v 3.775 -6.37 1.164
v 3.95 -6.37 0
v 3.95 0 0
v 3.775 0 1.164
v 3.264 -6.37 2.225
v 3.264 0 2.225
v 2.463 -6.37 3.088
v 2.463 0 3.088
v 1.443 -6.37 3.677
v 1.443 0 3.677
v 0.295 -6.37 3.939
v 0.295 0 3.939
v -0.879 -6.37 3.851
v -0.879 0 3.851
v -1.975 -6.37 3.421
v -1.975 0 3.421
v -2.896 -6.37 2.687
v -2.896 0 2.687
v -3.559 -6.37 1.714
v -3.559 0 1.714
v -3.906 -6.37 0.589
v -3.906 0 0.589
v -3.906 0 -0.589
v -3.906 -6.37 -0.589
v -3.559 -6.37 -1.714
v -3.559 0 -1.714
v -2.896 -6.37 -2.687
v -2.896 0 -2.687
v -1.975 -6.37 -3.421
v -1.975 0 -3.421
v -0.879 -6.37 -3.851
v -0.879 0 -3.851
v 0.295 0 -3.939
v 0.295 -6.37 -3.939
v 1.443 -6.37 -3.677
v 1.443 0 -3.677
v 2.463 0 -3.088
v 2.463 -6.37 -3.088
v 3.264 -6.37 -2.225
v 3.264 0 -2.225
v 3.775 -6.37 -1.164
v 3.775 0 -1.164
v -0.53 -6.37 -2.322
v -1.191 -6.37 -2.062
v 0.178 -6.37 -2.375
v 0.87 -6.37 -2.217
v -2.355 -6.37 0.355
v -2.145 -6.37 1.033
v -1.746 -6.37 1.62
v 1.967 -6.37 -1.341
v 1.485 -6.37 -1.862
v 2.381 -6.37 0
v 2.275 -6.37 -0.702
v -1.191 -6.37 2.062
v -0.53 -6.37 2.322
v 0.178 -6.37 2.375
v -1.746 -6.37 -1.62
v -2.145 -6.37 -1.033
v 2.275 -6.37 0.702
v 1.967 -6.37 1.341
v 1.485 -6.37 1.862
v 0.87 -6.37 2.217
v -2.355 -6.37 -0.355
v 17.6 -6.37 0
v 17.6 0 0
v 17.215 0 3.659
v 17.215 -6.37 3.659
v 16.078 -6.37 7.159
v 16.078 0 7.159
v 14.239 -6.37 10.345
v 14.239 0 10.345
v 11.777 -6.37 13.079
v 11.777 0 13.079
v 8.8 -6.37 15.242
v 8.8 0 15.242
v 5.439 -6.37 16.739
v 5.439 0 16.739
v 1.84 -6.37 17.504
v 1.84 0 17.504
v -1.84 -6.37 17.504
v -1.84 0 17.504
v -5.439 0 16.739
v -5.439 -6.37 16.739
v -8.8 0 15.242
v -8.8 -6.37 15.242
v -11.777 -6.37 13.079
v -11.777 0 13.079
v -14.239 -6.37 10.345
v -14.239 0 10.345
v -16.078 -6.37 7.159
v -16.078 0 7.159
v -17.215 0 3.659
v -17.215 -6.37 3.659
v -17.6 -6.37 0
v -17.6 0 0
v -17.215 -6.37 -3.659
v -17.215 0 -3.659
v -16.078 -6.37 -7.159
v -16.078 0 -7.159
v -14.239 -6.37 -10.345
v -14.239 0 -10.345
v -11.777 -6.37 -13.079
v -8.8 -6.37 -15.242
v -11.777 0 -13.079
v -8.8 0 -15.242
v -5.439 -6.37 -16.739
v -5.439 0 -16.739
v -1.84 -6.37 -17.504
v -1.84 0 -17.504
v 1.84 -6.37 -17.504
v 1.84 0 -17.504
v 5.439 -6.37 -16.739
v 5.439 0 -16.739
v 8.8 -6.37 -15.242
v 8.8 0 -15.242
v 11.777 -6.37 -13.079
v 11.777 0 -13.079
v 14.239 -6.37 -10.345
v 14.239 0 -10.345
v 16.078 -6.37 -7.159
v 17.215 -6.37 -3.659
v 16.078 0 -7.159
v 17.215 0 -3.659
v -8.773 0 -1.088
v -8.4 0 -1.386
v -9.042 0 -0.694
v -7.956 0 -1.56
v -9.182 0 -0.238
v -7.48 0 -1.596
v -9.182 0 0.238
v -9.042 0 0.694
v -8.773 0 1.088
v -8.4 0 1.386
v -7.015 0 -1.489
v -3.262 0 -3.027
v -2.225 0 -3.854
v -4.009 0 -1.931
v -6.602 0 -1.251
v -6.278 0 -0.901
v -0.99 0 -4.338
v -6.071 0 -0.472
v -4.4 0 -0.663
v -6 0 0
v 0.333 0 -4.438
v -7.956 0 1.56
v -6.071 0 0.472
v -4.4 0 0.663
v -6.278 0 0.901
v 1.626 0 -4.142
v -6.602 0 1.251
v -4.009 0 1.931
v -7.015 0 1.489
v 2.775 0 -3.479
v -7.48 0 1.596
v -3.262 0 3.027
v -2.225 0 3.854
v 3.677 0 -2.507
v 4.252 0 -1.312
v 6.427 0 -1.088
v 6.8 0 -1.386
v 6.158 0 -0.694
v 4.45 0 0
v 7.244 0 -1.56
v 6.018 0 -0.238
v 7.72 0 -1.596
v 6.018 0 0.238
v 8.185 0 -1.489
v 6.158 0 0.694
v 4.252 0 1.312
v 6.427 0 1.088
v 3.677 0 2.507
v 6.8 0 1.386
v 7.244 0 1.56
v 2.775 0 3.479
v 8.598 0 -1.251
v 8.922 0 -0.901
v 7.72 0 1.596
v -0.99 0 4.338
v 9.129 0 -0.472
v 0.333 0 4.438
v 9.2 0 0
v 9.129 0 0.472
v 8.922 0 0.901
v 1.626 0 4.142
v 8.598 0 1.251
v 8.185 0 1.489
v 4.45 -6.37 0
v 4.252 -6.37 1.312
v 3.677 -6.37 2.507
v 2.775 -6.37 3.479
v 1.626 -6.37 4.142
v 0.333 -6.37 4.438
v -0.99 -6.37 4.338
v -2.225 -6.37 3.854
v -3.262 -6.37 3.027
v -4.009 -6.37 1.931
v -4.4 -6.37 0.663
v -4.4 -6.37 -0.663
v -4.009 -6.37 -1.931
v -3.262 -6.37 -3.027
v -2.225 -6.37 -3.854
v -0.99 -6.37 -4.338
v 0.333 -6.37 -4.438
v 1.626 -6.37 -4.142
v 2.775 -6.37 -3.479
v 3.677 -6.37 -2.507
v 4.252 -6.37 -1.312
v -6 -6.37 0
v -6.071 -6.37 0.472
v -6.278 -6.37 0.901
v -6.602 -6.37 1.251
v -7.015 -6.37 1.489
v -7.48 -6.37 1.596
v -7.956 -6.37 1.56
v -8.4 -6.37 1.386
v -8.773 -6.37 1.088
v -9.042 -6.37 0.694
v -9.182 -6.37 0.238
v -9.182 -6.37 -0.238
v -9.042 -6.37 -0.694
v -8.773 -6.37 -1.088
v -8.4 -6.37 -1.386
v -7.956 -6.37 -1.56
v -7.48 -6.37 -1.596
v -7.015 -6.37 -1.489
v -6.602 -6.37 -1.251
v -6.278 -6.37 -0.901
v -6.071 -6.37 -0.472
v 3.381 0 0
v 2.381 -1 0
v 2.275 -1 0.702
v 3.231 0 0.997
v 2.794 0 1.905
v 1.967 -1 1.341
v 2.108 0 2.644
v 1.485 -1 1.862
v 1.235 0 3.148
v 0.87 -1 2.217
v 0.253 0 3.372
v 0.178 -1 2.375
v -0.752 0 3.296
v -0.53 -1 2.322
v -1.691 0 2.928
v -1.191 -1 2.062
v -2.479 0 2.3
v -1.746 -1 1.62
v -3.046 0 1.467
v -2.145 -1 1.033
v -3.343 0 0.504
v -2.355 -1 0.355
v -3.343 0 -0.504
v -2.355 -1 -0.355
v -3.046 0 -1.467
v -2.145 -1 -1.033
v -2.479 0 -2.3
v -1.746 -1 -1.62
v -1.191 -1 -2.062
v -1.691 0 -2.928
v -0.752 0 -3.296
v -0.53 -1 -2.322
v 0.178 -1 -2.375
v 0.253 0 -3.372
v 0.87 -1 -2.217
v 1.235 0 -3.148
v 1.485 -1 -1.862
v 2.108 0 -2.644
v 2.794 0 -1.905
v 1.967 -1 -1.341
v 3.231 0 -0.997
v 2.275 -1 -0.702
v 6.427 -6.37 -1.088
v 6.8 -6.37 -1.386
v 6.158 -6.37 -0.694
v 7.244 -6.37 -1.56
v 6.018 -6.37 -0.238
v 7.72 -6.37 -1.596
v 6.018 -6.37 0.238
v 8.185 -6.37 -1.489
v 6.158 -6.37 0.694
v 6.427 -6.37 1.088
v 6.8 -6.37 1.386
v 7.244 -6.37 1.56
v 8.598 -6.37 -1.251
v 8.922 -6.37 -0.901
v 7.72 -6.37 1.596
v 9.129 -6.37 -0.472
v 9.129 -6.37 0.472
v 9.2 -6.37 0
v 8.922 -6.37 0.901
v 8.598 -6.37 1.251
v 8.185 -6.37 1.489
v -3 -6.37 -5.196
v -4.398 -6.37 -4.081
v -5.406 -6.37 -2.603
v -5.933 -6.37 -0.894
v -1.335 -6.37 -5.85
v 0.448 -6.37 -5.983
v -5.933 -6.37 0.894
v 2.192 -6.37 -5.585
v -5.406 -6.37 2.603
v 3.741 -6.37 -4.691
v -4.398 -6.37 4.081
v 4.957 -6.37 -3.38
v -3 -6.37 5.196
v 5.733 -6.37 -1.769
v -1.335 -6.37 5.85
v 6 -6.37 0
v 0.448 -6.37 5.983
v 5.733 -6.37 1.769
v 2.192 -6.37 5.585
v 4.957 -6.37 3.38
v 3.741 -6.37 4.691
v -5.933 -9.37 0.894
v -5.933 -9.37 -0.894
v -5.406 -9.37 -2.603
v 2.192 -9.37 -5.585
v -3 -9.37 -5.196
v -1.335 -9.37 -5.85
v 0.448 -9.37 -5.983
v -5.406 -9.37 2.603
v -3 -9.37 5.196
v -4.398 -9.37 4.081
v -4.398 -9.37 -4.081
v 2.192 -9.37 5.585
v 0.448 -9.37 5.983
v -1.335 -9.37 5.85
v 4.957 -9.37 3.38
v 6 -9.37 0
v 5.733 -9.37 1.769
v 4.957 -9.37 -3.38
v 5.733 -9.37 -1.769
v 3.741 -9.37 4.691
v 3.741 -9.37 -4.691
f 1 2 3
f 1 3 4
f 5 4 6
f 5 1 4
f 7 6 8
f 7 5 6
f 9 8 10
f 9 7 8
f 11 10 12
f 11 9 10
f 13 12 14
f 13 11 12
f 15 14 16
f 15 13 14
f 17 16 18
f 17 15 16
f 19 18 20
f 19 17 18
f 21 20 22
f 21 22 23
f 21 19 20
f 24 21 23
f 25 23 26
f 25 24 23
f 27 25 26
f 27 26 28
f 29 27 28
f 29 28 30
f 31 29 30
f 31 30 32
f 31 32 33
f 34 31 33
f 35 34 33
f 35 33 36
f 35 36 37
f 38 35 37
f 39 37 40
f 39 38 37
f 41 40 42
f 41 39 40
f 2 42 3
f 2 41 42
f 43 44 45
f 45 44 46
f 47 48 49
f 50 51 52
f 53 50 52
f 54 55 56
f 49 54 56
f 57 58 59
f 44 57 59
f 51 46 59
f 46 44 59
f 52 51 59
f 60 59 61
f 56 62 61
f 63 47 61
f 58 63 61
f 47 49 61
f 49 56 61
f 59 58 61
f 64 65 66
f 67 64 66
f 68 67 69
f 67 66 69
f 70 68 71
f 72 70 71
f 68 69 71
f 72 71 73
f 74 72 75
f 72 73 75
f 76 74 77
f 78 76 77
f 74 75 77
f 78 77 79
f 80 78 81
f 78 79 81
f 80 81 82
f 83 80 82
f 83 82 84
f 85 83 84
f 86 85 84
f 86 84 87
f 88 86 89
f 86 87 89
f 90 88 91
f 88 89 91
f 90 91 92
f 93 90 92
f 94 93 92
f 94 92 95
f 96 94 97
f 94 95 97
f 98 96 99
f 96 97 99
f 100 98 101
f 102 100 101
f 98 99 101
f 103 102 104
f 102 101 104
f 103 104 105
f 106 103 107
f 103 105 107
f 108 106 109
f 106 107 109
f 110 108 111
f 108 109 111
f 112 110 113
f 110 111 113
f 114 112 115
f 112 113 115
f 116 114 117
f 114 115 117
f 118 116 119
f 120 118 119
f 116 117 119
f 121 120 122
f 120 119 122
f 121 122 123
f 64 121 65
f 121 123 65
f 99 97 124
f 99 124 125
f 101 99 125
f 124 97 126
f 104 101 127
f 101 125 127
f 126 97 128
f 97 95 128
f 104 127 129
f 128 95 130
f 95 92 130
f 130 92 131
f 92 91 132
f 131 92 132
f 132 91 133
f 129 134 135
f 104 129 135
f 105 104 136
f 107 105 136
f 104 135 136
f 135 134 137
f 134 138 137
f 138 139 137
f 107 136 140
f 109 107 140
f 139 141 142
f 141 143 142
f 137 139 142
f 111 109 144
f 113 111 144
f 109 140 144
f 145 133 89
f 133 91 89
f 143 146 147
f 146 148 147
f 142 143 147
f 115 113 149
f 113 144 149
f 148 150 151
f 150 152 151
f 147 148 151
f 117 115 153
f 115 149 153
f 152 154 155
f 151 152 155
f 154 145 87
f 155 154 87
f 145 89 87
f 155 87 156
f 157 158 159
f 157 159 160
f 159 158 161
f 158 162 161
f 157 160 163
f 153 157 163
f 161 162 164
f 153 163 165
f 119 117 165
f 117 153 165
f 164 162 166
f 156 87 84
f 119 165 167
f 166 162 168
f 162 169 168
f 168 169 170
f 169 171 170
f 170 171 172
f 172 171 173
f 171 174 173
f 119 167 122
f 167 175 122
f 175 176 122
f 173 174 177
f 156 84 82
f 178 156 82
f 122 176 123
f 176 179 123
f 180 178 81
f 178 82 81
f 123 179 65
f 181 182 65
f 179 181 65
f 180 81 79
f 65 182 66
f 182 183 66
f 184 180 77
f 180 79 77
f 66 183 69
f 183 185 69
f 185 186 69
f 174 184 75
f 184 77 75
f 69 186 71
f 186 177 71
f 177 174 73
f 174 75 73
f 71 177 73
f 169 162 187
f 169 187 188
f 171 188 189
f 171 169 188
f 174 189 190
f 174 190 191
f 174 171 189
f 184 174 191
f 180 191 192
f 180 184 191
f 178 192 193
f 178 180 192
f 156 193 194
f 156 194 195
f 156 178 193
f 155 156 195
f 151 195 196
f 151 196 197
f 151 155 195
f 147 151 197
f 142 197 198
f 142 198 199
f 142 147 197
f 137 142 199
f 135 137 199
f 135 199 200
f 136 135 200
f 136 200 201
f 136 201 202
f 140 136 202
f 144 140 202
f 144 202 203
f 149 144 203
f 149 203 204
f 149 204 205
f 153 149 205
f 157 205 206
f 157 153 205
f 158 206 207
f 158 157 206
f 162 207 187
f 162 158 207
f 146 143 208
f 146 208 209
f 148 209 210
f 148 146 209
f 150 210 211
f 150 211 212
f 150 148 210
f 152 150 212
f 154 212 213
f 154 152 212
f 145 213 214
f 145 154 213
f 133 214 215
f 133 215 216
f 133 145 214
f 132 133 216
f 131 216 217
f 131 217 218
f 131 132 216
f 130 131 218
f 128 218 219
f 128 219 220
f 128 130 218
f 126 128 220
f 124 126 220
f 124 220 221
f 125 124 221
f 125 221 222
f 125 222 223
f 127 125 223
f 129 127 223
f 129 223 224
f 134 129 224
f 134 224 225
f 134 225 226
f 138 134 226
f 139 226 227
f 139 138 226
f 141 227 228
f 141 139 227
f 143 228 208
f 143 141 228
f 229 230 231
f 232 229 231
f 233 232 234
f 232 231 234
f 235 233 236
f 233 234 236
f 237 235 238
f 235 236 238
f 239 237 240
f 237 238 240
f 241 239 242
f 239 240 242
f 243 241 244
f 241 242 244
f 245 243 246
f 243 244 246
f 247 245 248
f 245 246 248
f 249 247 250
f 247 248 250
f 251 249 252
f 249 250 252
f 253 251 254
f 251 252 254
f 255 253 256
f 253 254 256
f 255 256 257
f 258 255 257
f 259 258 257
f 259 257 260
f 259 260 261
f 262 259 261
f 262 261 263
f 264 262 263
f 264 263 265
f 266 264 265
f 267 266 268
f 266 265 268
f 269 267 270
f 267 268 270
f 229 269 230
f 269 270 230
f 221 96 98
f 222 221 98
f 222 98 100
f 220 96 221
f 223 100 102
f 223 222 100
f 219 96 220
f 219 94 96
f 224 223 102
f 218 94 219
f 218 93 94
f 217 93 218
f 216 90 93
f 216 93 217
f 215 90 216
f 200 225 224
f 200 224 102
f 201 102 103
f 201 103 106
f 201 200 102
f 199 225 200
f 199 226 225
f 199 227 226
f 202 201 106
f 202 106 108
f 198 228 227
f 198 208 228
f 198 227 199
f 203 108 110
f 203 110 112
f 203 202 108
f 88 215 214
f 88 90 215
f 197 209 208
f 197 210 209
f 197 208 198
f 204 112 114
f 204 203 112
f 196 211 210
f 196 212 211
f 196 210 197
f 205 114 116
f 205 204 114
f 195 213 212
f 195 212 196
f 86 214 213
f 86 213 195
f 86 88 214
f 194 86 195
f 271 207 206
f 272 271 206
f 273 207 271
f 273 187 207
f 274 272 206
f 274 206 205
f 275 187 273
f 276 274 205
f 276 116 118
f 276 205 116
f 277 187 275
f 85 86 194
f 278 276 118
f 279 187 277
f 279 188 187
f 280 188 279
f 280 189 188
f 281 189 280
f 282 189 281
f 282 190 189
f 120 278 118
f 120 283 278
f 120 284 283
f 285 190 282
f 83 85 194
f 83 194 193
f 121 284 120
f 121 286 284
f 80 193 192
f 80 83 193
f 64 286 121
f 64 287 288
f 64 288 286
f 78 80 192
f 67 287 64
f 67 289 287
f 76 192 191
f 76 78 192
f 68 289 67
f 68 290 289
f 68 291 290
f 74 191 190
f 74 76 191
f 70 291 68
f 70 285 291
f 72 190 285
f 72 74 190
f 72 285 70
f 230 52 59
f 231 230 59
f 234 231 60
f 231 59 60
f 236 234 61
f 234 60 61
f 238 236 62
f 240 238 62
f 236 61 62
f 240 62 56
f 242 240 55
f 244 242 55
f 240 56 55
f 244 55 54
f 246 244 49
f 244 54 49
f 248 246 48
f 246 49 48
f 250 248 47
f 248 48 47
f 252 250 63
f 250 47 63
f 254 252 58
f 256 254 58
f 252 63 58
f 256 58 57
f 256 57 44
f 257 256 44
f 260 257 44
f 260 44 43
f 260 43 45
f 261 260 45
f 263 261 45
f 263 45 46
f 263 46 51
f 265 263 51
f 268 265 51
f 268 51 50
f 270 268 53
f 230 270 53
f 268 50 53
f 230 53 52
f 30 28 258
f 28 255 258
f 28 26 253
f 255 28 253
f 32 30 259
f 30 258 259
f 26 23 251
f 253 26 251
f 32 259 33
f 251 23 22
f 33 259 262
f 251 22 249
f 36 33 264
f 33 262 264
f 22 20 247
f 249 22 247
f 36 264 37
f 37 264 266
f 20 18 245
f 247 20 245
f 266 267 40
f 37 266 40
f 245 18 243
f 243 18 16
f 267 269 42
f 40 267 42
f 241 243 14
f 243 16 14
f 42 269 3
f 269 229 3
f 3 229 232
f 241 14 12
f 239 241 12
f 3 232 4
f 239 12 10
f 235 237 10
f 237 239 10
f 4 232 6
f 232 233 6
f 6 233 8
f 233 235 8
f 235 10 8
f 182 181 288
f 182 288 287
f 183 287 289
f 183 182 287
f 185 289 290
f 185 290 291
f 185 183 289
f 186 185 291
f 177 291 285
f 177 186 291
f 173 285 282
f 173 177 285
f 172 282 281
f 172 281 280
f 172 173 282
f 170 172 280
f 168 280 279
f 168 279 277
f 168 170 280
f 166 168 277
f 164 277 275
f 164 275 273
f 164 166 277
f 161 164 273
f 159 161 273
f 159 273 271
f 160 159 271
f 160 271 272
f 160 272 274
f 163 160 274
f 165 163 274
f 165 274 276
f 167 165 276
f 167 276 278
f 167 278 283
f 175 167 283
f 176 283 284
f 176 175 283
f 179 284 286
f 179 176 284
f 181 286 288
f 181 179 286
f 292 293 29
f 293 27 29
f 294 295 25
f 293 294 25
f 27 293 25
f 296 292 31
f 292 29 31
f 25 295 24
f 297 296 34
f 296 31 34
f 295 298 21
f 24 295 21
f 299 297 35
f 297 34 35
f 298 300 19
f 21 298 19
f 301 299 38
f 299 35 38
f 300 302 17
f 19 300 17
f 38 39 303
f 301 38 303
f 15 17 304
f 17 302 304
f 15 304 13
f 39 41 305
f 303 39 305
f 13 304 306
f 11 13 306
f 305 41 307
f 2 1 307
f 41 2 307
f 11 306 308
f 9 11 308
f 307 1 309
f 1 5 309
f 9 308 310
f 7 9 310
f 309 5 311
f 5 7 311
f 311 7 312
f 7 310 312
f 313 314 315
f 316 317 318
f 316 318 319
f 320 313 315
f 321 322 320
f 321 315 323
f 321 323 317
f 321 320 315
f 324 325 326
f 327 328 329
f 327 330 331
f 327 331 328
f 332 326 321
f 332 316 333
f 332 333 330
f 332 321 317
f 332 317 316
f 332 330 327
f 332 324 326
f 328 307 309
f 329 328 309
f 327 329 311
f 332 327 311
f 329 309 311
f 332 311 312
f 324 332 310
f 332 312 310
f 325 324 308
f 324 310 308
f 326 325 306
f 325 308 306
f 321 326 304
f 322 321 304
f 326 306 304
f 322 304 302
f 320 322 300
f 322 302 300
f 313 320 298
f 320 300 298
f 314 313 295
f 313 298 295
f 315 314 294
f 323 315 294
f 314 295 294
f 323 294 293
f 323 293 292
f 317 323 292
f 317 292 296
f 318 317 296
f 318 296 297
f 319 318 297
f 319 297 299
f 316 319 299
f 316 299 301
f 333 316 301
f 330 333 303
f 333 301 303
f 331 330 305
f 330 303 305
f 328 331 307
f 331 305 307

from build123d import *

# Parameters (mm, degrees)
F0_R     = 17.6
F0_R_2   = 1.6
F0_R_3   = 4.45
F1_DEPTH = 6.37
F2_R     = 3.95
F2_R_2   = 2.38125
F3_DEPTH = 6.37
F2_R_3   = 4.45
F4_DEPTH = 3
F5_SIZE  = 1


with BuildPart() as f1:
    # F0 (on Front) → F1 (new body)
    with BuildSketch(Plane.XZ):
        Circle(F0_R)
        with Locations((-7.6, 0)):
            Circle(F0_R_2, mode=Mode.SUBTRACT)
        Circle(F0_R_3, mode=Mode.SUBTRACT)
        with Locations((7.6, 0)):
            Circle(F0_R_2, mode=Mode.SUBTRACT)
    extrude(amount=F1_DEPTH)


with BuildPart() as f3:
    # F2 (on face) → F3 (new body, through all)
    with BuildSketch(Plane.XZ.offset(6.37)):
        Circle(F2_R)
        Circle(F2_R_2, mode=Mode.SUBTRACT)
    extrude(amount=-F3_DEPTH)

    # F2 (on face) → F4 (join)
    with BuildSketch(Plane.XZ.offset(6.37)):
        with BuildLine():
            ThreePointArc((-6, 0), (0, -6), (6, 0))
            ThreePointArc((6, 0), (0, 6), (-6, 0))
        make_face()
        Circle(F2_R_3, mode=Mode.SUBTRACT)
        Circle(F2_R_3)
        Circle(F2_R, mode=Mode.SUBTRACT)
        Circle(F2_R)
        Circle(F2_R_2, mode=Mode.SUBTRACT)
        Circle(F2_R_2)
    extrude(amount=F4_DEPTH)

    # F5
    f5_edges = [f3.edges().sort_by_distance(p)[0] for p in [
        (-2.38125, 0, 0),
    ]]
    chamfer(f5_edges, length=F5_SIZE)


solid = Compound([f1.part, f3.part])
